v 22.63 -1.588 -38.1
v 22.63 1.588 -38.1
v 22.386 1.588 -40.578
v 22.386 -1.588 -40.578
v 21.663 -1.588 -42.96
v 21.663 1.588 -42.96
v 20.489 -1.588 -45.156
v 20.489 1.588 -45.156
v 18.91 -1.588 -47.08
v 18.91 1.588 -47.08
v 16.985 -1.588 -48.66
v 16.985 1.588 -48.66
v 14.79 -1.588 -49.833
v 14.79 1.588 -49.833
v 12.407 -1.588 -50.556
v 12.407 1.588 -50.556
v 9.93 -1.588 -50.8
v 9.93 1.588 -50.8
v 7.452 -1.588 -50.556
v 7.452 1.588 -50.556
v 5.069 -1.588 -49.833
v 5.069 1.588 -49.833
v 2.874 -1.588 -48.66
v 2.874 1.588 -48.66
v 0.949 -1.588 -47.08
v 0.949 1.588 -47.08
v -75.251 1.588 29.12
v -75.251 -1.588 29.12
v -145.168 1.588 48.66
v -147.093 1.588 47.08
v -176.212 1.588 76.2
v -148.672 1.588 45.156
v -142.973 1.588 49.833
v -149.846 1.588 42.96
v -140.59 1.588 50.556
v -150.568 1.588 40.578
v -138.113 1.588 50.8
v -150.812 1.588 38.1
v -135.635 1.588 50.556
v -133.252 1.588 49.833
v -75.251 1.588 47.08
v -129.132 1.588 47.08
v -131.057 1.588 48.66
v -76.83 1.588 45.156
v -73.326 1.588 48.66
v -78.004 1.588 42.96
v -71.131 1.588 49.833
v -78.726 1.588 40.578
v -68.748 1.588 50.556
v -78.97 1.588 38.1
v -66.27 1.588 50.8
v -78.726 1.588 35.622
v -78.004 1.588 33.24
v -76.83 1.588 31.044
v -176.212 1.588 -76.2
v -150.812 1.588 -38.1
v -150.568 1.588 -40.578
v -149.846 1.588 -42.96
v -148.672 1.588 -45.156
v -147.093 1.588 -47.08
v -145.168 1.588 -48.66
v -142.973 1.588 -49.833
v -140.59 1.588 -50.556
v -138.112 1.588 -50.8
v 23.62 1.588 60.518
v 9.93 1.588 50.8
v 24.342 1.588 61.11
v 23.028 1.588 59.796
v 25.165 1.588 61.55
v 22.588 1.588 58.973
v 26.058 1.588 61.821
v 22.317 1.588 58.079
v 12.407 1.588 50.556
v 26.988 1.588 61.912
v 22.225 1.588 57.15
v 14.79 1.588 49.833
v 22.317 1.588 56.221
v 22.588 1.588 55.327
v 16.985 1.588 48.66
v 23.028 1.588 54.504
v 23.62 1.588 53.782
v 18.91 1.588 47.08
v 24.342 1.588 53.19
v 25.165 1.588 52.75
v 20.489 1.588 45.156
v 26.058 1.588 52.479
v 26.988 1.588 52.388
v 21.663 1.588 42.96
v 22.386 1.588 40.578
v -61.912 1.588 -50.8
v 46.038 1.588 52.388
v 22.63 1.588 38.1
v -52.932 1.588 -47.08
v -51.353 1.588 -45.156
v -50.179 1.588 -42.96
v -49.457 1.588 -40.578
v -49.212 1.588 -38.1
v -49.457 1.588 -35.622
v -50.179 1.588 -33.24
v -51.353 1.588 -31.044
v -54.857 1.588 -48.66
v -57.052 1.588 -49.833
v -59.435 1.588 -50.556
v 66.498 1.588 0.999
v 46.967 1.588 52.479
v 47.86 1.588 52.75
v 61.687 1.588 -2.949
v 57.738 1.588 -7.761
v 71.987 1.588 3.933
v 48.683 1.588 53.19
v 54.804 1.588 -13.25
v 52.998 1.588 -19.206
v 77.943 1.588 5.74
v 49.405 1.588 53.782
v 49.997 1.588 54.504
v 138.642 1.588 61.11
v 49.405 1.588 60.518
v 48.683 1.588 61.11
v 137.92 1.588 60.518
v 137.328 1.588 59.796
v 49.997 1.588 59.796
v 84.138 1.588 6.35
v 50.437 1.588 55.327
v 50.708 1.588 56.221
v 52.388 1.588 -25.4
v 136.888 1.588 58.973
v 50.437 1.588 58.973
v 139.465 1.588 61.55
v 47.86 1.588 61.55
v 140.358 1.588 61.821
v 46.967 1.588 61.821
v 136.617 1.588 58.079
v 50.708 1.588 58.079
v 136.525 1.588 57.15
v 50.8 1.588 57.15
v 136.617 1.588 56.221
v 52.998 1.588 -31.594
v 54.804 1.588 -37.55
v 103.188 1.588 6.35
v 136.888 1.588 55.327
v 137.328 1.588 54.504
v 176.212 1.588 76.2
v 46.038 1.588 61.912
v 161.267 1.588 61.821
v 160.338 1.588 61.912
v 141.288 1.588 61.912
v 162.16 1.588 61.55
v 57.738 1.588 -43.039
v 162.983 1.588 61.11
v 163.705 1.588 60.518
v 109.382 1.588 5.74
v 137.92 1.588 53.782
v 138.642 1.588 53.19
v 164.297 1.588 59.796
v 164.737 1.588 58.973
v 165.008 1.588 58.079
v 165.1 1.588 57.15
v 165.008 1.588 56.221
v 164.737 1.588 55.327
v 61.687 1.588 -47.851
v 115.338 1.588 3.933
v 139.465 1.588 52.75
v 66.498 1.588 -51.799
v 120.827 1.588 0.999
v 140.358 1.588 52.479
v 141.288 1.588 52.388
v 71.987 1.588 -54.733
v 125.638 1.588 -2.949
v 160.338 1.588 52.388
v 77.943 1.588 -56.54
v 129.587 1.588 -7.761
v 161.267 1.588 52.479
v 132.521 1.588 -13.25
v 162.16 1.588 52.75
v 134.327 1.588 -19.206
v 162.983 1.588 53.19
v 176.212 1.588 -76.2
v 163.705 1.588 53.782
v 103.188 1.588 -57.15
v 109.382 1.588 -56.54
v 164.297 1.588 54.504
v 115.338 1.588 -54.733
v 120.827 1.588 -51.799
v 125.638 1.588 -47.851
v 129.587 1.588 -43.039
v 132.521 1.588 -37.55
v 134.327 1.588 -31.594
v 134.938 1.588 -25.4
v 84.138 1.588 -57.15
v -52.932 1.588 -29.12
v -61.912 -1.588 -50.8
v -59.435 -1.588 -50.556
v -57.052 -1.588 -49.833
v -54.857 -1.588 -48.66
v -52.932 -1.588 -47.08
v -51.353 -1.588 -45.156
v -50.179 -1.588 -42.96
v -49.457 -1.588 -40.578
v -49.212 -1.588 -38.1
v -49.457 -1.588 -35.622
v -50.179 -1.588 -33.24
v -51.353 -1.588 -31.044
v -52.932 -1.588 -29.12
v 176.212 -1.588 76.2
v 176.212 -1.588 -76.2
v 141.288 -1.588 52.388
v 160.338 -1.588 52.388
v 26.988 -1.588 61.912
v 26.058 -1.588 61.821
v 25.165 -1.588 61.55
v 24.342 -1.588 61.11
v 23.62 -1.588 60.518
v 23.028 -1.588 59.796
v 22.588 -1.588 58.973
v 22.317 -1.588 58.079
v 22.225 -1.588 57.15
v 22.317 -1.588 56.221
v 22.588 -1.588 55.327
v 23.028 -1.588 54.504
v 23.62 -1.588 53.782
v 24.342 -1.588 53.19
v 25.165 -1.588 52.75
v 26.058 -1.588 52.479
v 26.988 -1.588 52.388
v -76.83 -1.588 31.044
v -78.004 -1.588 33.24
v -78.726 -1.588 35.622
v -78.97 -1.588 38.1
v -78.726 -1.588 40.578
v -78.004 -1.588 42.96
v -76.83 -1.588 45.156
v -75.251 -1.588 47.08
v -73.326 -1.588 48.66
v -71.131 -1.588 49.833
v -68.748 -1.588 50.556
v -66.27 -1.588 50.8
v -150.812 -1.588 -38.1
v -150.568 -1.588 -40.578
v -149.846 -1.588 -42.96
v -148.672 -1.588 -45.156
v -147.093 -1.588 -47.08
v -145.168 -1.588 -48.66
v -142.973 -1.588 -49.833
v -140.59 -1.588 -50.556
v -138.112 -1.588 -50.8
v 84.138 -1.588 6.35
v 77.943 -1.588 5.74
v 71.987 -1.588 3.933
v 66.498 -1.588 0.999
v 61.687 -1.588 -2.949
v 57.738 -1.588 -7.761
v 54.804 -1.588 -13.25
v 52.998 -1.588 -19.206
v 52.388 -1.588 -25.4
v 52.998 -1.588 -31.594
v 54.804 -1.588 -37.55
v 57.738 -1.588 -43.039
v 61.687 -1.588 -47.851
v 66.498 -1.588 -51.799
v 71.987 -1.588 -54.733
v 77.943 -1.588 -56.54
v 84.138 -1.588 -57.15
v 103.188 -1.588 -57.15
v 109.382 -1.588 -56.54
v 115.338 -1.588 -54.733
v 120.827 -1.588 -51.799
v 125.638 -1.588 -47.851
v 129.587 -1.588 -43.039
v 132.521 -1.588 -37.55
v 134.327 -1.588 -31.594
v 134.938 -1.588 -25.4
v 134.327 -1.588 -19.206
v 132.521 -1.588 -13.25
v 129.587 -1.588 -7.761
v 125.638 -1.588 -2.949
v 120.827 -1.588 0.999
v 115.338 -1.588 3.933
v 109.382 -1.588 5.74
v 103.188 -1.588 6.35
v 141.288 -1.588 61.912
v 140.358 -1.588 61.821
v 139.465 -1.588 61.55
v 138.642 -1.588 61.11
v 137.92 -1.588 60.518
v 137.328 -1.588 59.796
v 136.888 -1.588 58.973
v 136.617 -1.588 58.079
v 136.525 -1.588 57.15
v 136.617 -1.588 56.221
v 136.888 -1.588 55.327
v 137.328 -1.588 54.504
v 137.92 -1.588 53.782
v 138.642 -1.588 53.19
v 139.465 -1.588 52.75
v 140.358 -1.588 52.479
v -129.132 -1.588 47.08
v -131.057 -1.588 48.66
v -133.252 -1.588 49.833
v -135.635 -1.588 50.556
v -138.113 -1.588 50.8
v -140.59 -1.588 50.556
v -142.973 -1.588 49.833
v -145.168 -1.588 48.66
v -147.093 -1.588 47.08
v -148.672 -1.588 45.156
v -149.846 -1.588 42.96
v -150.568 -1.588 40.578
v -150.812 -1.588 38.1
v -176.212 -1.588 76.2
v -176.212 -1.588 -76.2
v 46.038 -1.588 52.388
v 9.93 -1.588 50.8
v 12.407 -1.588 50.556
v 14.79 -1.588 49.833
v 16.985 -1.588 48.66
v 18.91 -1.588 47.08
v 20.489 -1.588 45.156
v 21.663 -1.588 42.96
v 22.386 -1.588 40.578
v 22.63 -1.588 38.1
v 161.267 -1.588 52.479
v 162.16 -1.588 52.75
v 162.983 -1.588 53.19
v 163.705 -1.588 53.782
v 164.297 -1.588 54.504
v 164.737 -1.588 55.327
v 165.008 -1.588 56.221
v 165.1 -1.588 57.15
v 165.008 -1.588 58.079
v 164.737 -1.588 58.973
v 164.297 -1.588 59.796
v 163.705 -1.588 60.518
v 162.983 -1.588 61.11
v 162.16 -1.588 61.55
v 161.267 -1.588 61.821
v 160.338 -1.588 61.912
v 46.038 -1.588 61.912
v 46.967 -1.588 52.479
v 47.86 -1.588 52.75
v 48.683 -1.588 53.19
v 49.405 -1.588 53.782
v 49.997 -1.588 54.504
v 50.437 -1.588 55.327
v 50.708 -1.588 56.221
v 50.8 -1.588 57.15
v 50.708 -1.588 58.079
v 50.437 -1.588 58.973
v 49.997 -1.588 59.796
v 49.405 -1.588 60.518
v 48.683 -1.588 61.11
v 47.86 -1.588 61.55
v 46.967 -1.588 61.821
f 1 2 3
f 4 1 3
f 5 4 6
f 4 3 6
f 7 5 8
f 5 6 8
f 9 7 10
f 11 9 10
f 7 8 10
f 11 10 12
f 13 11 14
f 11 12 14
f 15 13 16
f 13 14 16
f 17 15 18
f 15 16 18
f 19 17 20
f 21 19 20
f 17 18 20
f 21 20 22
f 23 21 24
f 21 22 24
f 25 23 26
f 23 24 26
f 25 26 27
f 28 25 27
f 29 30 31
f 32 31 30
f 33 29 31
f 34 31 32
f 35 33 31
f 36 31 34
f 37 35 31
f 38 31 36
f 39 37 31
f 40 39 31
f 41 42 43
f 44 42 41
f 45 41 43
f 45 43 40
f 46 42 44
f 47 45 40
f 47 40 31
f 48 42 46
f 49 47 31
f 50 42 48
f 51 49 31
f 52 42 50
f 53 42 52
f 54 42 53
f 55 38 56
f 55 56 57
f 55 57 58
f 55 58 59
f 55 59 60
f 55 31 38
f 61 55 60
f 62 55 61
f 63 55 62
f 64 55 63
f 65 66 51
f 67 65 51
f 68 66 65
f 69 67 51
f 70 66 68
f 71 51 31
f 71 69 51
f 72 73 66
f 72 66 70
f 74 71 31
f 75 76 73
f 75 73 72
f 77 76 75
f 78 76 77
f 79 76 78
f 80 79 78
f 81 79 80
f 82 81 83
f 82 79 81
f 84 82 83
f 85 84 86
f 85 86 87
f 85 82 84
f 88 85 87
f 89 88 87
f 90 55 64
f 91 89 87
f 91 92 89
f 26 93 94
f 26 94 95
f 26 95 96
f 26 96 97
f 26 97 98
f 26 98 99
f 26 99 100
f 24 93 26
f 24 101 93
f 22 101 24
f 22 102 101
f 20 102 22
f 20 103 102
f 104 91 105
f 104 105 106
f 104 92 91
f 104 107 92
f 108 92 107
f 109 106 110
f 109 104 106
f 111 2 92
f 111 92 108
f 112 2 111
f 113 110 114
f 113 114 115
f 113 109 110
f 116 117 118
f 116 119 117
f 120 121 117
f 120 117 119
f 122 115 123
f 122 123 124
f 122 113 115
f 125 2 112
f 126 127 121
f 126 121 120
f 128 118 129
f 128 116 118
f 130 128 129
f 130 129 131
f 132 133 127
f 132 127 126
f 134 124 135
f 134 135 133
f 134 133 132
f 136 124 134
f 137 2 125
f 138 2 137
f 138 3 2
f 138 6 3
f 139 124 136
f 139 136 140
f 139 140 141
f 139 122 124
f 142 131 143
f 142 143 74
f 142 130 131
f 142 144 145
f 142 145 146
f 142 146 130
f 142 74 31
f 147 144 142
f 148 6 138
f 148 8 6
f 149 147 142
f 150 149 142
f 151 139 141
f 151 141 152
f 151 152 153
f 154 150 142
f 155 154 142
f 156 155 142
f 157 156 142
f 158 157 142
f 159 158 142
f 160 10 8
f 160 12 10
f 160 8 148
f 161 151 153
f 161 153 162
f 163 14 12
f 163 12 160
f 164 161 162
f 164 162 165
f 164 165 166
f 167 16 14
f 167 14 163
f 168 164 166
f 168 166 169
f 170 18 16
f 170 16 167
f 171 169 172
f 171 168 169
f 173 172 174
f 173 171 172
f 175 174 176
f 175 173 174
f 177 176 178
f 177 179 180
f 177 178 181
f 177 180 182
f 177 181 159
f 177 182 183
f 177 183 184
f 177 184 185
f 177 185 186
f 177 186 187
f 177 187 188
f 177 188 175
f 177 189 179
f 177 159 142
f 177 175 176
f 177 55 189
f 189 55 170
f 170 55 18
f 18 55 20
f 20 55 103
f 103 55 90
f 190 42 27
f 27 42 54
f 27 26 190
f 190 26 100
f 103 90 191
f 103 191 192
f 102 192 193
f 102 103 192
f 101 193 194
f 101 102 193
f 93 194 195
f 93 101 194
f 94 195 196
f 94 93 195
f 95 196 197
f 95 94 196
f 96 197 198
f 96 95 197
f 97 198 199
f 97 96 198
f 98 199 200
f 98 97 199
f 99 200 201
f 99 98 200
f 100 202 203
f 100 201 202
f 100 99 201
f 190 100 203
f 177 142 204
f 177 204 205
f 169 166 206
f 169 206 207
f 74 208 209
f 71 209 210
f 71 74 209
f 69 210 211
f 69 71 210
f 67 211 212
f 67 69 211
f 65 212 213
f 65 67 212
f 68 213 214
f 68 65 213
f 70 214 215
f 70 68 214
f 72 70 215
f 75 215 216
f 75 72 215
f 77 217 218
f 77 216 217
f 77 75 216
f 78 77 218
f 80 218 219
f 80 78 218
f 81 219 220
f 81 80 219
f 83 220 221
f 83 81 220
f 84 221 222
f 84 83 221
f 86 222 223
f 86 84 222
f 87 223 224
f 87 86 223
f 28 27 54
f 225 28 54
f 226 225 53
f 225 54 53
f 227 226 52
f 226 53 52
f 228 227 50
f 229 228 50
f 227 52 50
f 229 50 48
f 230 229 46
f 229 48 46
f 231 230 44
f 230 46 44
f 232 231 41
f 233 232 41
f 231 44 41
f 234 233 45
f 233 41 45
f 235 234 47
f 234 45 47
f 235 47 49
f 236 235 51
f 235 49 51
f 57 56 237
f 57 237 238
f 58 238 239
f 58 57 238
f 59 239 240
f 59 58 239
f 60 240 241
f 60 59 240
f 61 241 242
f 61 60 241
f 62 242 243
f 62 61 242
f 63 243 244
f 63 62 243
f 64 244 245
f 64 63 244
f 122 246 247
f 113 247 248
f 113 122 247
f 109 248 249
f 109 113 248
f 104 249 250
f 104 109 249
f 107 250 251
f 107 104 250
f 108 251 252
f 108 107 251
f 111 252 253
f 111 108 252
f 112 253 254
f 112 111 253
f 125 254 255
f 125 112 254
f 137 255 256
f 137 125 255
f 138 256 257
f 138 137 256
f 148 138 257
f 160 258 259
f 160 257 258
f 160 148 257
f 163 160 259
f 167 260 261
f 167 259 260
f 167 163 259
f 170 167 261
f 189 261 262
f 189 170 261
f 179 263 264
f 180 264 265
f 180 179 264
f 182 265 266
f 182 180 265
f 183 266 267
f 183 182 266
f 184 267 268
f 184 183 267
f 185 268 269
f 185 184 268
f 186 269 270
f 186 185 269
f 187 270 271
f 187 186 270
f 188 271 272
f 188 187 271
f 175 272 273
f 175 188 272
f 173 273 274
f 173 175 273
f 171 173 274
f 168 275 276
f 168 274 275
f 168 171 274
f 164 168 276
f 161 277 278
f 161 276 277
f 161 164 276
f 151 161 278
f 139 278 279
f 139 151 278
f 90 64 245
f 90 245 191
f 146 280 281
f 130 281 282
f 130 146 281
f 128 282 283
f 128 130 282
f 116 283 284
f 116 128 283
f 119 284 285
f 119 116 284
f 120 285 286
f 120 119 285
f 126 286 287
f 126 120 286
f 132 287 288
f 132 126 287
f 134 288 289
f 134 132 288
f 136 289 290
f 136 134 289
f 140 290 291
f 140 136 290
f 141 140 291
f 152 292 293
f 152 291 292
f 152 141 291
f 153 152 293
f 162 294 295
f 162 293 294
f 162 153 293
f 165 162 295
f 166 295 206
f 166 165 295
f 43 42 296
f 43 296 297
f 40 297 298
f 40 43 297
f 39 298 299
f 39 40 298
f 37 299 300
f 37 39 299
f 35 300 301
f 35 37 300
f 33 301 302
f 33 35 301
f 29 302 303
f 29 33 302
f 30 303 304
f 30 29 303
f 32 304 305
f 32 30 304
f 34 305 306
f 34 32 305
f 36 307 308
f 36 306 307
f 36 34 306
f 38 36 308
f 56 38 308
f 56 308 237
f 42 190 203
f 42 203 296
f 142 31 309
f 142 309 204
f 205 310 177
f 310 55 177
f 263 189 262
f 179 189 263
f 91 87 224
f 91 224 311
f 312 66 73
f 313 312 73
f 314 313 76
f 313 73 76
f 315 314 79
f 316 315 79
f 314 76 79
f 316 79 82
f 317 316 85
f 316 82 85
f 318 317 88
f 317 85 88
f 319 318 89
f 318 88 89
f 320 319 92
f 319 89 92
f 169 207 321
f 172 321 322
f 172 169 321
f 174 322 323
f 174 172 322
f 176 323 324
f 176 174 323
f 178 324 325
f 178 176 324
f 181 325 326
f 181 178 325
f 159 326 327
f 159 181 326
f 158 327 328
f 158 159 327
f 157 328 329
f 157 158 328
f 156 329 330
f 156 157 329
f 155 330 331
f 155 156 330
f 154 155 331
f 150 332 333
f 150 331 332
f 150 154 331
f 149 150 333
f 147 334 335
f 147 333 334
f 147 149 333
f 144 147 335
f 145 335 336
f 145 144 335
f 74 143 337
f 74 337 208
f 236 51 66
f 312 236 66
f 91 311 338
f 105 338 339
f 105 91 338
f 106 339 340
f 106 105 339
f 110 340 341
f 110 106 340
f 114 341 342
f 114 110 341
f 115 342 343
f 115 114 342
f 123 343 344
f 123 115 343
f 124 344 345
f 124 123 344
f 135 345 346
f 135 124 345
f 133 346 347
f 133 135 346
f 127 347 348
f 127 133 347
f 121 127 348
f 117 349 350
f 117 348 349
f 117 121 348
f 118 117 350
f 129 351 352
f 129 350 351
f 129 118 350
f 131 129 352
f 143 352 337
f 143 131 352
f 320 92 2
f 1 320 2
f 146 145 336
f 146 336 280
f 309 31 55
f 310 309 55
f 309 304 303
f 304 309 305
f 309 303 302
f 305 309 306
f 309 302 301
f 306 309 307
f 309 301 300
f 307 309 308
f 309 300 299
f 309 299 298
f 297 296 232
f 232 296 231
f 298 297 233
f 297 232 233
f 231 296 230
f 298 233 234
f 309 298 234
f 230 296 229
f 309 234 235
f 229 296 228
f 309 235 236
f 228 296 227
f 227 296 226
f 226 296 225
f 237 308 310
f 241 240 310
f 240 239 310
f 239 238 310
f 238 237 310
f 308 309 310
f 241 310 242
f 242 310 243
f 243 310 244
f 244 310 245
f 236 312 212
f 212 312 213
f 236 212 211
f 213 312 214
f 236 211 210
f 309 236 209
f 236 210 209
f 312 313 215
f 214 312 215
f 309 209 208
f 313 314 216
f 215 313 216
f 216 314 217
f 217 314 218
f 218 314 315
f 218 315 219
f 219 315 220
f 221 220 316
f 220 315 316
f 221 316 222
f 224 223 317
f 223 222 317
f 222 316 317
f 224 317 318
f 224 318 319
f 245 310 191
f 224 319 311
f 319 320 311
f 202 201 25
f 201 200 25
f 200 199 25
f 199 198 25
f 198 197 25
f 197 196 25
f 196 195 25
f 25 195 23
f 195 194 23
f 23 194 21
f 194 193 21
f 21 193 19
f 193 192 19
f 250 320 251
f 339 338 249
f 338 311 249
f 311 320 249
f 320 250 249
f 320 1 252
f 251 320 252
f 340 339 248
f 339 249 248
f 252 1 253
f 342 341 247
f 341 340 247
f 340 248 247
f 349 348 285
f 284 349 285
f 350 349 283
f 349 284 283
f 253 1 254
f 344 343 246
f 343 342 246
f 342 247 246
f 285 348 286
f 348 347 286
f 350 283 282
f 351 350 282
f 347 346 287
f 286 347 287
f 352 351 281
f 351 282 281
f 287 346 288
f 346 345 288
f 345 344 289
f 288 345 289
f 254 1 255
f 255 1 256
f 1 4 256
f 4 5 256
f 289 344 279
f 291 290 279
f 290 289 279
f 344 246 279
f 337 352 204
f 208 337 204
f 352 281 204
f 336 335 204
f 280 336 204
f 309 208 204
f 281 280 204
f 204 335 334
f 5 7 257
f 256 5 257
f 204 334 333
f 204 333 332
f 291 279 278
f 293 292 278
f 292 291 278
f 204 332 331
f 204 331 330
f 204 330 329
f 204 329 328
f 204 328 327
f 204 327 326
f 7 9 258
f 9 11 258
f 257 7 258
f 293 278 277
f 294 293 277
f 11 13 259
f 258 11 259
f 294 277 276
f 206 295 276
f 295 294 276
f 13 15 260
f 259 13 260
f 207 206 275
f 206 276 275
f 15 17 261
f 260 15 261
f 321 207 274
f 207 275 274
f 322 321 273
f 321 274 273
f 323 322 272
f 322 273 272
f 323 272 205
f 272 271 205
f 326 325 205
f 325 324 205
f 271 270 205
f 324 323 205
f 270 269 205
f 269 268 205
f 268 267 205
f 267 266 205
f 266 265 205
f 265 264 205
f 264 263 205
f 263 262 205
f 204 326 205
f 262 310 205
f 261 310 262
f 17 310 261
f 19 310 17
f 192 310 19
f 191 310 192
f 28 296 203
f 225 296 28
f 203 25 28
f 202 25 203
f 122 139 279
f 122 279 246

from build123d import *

# Parameters (mm, degrees)
SKETCH1_W           = 352.425
SKETCH1_H           = 152.4
BOSS_EXTRUDE1_DEPTH = 1.5875
CUT_EXTRUDE1_DEPTH  = 4.175
CUT_EXTRUDE2_DEPTH  = 4.175


with BuildPart() as part:
    # Sketch1 → Boss-Extrude1 (new body, symmetric)
    with BuildSketch(Plane(origin=(0, 0, 0), x_dir=(1, 0, 0), z_dir=(0, 1, 0))):
        Rectangle(SKETCH1_W, SKETCH1_H)
    extrude(amount=BOSS_EXTRUDE1_DEPTH, both=True)

    # Sketch2 → Cut-Extrude1 (cut, through all)
    with BuildSketch(Plane(origin=(0, 1.5875, 0), x_dir=(1, 0, 0), z_dir=(0, 1, 0))):
        with BuildLine():
            Line((103.1875, -6.35), (84.1375, -6.35))
            ThreePointArc((84.1375, -6.35), (52.3875, 25.4), (84.1375, 57.15))
            Line((84.1375, 57.15), (103.1875, 57.15))
            ThreePointArc((103.1875, 57.15), (134.9375, 25.4), (103.1875, -6.35))
        make_face()
        with BuildLine():
            Line((-138.1125, 50.8), (-61.9125, 50.8))
            ThreePointArc((-61.9125, 50.8), (-50.179229937, 42.960079591), (-52.932243879, 29.119743879))
            Line((-52.932243879, 29.119743879), (-129.132243879, -47.080256121))
            ThreePointArc((-129.132243879, -47.080256121), (-142.972579591, -49.833270063), (-150.8125, -38.1))
            Line((-150.8125, -38.1), (-150.8125, 38.1))
            ThreePointArc((-150.8125, 38.1), (-147.092756121, 47.080256121), (-138.1125, 50.8))
        make_face()
        with BuildLine():
            Line((-66.270451031, -50.8), (9.929548969, -50.8))
            ThreePointArc((9.929548969, -50.8), (18.90980509, -47.080256121), (22.629548969, -38.1))
            Line((22.629548969, -38.1), (22.629548969, 38.1))
            ThreePointArc((22.629548969, 38.1), (14.78962856, 49.833270063), (0.949292847, 47.080256121))
            Line((0.949292847, 47.080256121), (-75.250707153, -29.119743879))
            ThreePointArc((-75.250707153, -29.119743879), (-78.003721094, -42.960079591), (-66.270451031, -50.8))
        make_face()
    extrude(amount=-CUT_EXTRUDE1_DEPTH, mode=Mode.SUBTRACT)

    # Sketch3 → Cut-Extrude2 (cut, through all)
    with BuildSketch(Plane(origin=(0, 1.5875, 0), x_dir=(1, 0, 0), z_dir=(0, 1, 0))):
        with BuildLine():
            Line((160.3375, -61.9125), (141.2875, -61.9125))
            ThreePointArc((141.2875, -61.9125), (136.525, -57.15), (141.2875, -52.3875))
            Line((141.2875, -52.3875), (160.3375, -52.3875))
            ThreePointArc((160.3375, -52.3875), (165.1, -57.15), (160.3375, -61.9125))
        make_face()
        with BuildLine():
            Line((46.0375, -61.9125), (26.9875, -61.9125))
            ThreePointArc((26.9875, -61.9125), (22.225, -57.15), (26.9875, -52.3875))
            Line((26.9875, -52.3875), (46.0375, -52.3875))
            ThreePointArc((46.0375, -52.3875), (50.8, -57.15), (46.0375, -61.9125))
        make_face()
    extrude(amount=-CUT_EXTRUDE2_DEPTH, mode=Mode.SUBTRACT)


solid = part.part
